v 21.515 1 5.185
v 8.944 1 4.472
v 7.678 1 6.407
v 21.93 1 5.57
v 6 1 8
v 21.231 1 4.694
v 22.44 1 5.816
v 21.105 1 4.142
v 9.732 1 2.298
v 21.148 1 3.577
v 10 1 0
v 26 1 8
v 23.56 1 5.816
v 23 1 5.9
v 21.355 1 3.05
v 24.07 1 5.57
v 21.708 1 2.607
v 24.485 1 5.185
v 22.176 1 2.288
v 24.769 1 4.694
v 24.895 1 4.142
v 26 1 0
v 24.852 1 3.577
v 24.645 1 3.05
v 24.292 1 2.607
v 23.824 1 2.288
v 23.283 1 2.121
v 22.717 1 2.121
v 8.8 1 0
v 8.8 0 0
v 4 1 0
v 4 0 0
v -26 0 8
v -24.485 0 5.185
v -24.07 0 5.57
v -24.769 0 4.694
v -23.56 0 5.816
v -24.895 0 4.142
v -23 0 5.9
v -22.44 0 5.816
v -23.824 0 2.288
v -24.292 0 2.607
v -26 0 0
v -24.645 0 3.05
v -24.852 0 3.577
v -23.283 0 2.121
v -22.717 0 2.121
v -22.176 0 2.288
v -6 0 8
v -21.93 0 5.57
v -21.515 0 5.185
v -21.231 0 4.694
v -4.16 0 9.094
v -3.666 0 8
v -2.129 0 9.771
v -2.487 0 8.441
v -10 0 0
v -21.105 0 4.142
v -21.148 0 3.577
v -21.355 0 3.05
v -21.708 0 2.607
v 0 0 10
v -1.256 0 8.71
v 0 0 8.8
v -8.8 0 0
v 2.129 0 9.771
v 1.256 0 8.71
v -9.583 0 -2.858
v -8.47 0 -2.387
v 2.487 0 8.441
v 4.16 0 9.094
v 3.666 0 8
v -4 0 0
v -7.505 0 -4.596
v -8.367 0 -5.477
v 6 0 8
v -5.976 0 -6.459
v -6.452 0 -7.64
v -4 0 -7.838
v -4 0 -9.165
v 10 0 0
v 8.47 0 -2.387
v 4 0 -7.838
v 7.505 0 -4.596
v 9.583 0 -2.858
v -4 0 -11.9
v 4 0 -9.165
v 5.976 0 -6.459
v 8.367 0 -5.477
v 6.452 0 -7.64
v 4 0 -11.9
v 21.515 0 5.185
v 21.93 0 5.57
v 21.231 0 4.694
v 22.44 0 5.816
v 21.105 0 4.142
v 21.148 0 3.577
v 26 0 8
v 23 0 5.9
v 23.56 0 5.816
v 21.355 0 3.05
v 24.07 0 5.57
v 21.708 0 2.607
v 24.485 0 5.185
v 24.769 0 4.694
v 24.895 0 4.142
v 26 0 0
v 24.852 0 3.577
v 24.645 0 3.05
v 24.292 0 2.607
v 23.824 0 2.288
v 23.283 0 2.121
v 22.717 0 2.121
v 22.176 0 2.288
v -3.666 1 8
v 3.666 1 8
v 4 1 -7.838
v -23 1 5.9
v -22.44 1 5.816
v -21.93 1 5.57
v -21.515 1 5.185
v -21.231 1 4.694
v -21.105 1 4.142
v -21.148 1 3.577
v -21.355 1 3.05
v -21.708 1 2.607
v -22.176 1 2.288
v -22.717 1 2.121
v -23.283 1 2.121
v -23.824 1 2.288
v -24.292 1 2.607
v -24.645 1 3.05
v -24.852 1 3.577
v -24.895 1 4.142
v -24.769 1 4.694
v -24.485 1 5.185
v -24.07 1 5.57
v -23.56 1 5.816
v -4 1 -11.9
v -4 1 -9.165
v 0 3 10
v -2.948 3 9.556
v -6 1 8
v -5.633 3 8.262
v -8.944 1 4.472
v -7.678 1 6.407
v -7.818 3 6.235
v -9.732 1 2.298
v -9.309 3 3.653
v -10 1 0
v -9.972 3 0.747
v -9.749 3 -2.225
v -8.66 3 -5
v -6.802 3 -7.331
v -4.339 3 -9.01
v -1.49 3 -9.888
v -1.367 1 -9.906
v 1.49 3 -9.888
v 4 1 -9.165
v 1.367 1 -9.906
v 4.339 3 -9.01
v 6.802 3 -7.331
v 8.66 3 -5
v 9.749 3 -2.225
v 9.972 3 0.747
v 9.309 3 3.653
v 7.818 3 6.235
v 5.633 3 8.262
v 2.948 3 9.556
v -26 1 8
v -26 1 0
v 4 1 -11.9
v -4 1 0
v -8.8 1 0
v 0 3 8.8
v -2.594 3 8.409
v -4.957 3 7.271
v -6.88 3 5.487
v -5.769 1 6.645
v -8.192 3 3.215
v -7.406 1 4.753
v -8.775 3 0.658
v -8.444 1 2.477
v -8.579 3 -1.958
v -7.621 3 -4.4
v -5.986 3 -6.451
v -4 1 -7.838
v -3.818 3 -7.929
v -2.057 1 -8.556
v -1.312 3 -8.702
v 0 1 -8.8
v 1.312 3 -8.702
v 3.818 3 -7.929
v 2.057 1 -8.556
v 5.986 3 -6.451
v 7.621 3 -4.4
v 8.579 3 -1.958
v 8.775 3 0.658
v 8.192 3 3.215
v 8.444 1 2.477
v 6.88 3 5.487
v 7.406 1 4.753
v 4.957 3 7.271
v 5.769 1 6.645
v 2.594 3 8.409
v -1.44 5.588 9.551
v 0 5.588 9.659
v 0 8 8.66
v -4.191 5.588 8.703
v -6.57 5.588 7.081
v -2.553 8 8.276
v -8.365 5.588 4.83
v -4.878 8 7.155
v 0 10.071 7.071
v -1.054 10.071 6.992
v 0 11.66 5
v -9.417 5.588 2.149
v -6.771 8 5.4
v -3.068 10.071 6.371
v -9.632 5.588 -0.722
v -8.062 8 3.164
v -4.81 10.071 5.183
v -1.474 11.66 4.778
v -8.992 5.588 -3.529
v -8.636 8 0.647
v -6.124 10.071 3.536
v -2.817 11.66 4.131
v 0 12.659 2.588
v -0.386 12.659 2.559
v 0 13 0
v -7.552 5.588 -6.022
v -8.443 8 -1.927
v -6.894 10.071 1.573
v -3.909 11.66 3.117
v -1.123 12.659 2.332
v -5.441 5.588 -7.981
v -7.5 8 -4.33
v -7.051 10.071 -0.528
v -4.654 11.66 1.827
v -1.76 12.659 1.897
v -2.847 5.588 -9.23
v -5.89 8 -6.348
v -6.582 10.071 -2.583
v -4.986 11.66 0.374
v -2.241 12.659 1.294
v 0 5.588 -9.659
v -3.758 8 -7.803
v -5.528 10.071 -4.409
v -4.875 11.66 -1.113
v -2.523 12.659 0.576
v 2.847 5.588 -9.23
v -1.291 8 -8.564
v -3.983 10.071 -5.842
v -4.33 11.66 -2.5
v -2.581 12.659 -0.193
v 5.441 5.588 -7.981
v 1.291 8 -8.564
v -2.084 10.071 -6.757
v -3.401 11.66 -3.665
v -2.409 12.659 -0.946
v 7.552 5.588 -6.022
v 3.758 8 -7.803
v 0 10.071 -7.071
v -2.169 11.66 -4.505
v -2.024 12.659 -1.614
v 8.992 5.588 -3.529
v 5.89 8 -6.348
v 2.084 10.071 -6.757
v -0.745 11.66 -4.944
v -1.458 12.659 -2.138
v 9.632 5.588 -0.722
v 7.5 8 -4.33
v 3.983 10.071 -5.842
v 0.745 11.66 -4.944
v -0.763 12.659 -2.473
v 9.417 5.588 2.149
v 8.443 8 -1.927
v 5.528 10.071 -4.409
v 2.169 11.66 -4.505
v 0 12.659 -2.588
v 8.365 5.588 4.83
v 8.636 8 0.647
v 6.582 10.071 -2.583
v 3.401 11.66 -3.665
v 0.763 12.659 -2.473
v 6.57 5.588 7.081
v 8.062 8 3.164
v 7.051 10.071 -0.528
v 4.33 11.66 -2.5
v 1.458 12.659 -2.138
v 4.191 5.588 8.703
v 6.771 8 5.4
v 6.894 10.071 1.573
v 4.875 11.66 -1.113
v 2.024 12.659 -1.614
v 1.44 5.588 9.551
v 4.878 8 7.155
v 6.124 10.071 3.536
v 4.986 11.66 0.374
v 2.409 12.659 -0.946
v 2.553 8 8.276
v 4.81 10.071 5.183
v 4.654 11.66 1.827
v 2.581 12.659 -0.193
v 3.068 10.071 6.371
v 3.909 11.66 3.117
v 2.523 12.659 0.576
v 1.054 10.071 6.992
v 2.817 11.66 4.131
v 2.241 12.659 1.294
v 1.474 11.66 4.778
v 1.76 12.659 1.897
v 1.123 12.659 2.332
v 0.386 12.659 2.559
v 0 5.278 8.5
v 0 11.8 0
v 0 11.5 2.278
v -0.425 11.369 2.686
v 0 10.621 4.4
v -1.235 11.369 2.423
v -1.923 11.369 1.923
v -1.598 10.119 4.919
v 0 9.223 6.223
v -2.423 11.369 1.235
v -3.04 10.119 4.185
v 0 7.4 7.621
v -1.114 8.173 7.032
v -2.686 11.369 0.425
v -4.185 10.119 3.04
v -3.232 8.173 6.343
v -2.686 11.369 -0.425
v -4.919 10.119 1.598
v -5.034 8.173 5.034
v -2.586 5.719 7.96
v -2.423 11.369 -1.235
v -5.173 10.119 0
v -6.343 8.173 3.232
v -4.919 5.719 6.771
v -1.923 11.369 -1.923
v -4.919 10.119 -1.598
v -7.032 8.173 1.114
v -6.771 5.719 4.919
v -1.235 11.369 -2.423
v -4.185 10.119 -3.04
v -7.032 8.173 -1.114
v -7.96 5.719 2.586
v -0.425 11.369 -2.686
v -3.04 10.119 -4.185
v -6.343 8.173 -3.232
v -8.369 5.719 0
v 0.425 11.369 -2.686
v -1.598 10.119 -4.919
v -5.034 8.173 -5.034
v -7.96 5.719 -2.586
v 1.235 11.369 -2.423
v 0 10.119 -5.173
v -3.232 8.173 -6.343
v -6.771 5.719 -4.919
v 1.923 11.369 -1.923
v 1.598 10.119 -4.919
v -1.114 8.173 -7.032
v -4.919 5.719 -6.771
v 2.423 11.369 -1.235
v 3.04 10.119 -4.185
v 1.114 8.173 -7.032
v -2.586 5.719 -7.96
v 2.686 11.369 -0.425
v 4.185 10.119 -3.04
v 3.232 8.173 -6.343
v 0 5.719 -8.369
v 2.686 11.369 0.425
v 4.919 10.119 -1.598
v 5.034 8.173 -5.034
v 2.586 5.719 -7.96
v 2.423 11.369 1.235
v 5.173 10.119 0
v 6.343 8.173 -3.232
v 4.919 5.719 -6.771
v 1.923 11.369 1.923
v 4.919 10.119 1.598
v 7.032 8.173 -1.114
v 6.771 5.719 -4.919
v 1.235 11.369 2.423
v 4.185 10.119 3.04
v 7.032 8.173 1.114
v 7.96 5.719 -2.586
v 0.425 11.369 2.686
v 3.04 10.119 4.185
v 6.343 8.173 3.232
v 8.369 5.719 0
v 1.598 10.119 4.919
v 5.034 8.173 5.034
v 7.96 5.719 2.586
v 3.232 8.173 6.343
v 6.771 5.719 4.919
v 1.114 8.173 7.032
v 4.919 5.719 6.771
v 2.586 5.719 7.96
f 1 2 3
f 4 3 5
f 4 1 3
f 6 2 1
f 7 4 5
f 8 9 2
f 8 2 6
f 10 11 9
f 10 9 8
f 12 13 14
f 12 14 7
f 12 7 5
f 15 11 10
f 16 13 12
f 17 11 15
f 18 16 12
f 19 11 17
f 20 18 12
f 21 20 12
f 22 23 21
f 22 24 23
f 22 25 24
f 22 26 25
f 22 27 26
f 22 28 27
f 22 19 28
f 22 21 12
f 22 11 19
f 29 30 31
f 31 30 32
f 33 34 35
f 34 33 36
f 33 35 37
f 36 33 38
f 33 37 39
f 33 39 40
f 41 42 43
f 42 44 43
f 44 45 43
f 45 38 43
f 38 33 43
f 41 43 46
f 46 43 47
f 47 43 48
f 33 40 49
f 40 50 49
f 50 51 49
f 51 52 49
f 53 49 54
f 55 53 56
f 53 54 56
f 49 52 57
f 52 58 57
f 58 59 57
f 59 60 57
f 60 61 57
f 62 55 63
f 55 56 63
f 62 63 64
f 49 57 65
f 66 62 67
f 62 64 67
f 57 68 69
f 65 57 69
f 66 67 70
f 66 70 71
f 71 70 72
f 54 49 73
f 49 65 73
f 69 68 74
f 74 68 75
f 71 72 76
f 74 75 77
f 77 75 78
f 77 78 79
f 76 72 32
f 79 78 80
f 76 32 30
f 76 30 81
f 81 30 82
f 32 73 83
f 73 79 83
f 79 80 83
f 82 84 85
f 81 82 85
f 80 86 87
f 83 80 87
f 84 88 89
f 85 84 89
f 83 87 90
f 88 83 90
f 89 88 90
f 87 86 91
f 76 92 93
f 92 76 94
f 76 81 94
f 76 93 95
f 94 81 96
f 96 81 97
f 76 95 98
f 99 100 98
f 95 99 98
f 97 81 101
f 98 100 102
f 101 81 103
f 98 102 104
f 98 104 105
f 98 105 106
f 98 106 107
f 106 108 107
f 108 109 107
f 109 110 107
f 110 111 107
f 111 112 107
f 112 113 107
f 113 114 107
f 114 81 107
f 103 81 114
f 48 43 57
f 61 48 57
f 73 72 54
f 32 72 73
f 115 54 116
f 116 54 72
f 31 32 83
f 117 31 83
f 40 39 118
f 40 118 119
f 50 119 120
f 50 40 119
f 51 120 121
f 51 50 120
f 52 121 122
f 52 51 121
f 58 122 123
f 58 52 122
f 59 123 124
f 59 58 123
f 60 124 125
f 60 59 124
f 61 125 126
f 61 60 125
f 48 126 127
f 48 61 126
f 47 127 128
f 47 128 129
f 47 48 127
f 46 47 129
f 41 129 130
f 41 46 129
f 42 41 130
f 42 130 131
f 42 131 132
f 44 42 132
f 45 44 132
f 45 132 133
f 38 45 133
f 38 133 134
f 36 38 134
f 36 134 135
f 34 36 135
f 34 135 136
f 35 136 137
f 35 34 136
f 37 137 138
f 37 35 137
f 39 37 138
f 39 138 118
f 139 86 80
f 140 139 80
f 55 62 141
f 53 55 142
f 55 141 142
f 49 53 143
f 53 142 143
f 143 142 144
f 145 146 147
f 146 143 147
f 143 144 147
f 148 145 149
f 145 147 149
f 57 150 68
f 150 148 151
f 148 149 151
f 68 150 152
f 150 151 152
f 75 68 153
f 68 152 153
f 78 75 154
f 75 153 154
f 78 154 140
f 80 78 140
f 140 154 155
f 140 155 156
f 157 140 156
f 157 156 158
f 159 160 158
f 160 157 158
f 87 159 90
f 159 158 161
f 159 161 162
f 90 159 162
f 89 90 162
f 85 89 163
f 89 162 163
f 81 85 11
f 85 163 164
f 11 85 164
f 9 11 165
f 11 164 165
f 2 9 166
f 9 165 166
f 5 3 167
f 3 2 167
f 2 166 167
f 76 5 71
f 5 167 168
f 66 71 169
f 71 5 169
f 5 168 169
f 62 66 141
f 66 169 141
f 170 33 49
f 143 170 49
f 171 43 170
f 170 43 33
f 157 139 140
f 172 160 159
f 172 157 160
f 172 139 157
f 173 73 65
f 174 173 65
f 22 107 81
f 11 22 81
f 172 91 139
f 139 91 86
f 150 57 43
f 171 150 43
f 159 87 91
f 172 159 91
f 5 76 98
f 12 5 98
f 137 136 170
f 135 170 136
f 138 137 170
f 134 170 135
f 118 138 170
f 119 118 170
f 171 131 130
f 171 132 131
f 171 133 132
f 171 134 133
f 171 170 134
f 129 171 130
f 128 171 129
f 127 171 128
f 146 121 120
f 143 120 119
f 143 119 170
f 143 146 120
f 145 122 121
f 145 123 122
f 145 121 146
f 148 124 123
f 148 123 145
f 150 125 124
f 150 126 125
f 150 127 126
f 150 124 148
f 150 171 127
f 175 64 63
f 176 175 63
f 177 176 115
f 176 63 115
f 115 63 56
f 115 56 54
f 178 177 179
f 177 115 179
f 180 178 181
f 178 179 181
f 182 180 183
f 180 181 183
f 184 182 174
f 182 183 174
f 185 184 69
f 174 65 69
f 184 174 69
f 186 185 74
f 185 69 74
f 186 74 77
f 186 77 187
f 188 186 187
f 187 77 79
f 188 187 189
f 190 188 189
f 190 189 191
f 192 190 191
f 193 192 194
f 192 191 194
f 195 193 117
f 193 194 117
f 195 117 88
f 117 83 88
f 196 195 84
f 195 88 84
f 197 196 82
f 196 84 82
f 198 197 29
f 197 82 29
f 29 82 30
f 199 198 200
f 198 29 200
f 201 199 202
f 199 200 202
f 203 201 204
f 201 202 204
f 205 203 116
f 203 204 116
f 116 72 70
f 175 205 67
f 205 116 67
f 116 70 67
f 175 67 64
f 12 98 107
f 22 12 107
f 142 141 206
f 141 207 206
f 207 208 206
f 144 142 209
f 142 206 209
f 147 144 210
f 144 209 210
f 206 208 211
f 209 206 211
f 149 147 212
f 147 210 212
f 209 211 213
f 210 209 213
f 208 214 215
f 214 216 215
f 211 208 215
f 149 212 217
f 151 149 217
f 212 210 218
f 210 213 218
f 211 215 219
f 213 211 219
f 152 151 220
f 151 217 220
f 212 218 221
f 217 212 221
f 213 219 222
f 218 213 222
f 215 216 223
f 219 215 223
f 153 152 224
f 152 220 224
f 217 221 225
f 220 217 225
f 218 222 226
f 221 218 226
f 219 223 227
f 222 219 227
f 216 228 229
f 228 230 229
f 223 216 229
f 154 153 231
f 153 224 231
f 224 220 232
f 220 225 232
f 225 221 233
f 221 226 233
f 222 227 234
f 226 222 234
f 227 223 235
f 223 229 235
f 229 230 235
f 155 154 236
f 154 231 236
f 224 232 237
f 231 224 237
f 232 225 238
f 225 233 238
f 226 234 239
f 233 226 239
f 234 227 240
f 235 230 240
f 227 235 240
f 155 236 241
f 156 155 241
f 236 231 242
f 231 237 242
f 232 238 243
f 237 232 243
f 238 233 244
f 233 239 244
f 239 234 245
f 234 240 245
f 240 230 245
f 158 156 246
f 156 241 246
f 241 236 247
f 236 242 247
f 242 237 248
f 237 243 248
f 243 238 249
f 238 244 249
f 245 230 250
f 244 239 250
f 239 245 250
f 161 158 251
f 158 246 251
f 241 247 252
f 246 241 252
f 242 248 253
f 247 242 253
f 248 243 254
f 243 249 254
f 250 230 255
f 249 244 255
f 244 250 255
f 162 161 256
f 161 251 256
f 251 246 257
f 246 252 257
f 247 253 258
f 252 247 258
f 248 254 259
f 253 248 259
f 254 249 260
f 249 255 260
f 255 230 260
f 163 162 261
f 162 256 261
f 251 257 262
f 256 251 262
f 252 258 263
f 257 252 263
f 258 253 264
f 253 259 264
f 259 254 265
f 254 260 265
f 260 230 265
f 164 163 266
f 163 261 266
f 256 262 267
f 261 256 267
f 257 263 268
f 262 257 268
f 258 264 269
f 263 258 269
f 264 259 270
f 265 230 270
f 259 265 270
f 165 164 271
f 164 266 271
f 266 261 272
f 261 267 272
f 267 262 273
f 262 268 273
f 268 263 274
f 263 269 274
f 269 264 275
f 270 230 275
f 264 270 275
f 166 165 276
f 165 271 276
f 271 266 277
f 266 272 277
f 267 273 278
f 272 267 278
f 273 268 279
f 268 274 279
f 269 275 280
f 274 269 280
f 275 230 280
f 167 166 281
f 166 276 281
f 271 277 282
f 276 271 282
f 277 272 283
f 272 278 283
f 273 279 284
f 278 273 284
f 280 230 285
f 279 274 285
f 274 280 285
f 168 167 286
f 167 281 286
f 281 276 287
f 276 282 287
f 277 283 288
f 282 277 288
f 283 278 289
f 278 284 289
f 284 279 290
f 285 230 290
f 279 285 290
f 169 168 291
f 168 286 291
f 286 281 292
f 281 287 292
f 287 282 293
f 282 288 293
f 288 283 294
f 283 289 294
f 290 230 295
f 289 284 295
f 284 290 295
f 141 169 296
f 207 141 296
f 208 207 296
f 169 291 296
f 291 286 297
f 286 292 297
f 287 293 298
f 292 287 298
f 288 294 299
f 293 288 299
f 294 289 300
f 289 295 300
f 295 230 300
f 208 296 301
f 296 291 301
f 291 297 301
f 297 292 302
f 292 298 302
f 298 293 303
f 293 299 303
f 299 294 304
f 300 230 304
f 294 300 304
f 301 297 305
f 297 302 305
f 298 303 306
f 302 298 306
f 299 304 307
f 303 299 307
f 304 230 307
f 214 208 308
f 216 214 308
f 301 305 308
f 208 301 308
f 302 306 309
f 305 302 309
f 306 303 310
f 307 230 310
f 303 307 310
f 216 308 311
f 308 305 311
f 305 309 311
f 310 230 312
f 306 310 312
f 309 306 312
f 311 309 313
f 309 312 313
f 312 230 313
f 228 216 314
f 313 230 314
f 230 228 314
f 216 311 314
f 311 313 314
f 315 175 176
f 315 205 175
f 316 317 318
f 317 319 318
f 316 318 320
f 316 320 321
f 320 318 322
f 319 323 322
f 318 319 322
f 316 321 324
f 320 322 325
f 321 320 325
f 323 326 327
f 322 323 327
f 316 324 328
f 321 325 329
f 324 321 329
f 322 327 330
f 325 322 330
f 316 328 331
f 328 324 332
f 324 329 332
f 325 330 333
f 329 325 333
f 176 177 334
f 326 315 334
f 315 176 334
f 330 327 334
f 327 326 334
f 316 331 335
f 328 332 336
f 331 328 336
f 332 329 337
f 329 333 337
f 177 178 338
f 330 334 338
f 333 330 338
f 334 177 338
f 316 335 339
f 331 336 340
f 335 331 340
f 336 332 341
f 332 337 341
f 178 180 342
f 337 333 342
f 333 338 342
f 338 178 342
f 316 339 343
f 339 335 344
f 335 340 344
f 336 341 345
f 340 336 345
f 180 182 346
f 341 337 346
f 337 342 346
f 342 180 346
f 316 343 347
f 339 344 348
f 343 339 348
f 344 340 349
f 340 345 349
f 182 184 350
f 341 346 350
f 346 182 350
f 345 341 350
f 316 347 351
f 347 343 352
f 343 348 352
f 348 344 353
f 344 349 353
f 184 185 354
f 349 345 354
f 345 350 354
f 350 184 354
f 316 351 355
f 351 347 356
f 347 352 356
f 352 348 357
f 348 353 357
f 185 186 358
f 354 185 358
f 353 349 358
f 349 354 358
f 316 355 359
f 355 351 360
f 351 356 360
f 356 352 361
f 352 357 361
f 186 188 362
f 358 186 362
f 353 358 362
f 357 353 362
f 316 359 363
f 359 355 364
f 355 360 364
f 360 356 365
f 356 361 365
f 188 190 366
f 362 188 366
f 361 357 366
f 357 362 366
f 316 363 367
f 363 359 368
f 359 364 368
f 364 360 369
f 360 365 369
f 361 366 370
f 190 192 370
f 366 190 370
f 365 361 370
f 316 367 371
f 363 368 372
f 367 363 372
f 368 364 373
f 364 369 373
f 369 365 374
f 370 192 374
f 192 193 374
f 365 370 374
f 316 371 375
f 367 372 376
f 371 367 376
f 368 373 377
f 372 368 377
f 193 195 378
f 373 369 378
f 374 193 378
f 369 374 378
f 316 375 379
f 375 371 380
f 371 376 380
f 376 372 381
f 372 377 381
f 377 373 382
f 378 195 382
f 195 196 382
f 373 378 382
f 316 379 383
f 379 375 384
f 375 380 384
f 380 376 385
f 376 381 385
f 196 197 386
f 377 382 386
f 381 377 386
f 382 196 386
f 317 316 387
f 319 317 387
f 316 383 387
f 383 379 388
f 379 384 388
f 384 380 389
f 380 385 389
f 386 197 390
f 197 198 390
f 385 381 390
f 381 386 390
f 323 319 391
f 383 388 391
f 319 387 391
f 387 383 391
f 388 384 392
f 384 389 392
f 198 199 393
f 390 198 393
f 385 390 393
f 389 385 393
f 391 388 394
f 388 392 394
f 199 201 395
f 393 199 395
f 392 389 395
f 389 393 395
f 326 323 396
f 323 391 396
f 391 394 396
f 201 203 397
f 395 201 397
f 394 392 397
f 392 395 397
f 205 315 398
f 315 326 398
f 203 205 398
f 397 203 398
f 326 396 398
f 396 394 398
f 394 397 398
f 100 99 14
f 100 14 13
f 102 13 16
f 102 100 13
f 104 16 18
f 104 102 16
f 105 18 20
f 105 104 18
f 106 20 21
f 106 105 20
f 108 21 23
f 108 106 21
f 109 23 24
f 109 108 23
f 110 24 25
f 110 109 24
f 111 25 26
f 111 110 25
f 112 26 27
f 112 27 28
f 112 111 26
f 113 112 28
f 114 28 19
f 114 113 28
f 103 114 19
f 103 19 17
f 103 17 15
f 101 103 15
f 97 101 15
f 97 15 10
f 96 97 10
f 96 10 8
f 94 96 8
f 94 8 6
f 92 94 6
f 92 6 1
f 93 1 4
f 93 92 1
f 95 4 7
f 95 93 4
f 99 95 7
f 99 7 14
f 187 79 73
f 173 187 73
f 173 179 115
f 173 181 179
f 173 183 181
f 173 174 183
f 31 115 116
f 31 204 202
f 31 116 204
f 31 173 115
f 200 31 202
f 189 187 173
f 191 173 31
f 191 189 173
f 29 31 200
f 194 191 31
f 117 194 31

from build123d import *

# Parameters (mm, degrees)
SKETCH_2_R      = 1.9
EXTRUDE_1_DEPTH = 1


with BuildPart() as part:
    # Эскиз1 → Повернуть1 (revolve)
    with BuildSketch(Plane.XY, mode=Mode.PRIVATE) as revolve_1_sk:
        with BuildLine():
            Line((8.8, 0), (10, 0))
            Line((10, 0), (10, 3))
            ThreePointArc((10, 3), (7.071067812, 10.071067812), (0, 13))
            Line((0, 13), (0, 11.8))
            ThreePointArc((0, 11.8), (6.222539674, 9.222539674), (8.8, 3))
            Line((8.8, 3), (8.8, 0))
        make_face()
    revolve(revolve_1_sk.sketch.rotate(Axis((0, 13, 0), (0, -1, 0)), 90), axis=Axis((0, 13, 0), (0, -1, 0)))

    # Эскиз2 → Бобышка-Вытянуть1 (add)
    # profile 1 of 3: a face of its own
    with BuildSketch(Plane(origin=(0, 0, 0), x_dir=(1, 0, 0), z_dir=(0, 1, 0))):
        Polygon((0, -8), (0, 0), (-4, 0), (-26, 0), (-26, -8), align=None)
        with Locations(Location((-23, -4, 0), (0, 0, 270))):
            Circle(SKETCH_2_R, mode=Mode.SUBTRACT)
    # profile 2 of 3: a face of its own
    with BuildSketch(Plane(origin=(0, 0, 0), x_dir=(1, 0, 0), z_dir=(0, 1, 0))):
        Polygon((26, -8), (26, 0), (4, 0), (0, 0), (0, -8), align=None)
        with Locations(Location((23, -4, 0), (0, 0, 270))):
            Circle(SKETCH_2_R, mode=Mode.SUBTRACT)
    # profile 3 of 3: a face of its own
    with BuildSketch(Plane(origin=(0, 0, 0), x_dir=(1, 0, 0), z_dir=(0, 1, 0))):
        Polygon((0, 0), (4, 0), (4, 11.9), (-4, 11.9), (-4, 0), align=None)
    extrude(amount=EXTRUDE_1_DEPTH)


solid = part.part
